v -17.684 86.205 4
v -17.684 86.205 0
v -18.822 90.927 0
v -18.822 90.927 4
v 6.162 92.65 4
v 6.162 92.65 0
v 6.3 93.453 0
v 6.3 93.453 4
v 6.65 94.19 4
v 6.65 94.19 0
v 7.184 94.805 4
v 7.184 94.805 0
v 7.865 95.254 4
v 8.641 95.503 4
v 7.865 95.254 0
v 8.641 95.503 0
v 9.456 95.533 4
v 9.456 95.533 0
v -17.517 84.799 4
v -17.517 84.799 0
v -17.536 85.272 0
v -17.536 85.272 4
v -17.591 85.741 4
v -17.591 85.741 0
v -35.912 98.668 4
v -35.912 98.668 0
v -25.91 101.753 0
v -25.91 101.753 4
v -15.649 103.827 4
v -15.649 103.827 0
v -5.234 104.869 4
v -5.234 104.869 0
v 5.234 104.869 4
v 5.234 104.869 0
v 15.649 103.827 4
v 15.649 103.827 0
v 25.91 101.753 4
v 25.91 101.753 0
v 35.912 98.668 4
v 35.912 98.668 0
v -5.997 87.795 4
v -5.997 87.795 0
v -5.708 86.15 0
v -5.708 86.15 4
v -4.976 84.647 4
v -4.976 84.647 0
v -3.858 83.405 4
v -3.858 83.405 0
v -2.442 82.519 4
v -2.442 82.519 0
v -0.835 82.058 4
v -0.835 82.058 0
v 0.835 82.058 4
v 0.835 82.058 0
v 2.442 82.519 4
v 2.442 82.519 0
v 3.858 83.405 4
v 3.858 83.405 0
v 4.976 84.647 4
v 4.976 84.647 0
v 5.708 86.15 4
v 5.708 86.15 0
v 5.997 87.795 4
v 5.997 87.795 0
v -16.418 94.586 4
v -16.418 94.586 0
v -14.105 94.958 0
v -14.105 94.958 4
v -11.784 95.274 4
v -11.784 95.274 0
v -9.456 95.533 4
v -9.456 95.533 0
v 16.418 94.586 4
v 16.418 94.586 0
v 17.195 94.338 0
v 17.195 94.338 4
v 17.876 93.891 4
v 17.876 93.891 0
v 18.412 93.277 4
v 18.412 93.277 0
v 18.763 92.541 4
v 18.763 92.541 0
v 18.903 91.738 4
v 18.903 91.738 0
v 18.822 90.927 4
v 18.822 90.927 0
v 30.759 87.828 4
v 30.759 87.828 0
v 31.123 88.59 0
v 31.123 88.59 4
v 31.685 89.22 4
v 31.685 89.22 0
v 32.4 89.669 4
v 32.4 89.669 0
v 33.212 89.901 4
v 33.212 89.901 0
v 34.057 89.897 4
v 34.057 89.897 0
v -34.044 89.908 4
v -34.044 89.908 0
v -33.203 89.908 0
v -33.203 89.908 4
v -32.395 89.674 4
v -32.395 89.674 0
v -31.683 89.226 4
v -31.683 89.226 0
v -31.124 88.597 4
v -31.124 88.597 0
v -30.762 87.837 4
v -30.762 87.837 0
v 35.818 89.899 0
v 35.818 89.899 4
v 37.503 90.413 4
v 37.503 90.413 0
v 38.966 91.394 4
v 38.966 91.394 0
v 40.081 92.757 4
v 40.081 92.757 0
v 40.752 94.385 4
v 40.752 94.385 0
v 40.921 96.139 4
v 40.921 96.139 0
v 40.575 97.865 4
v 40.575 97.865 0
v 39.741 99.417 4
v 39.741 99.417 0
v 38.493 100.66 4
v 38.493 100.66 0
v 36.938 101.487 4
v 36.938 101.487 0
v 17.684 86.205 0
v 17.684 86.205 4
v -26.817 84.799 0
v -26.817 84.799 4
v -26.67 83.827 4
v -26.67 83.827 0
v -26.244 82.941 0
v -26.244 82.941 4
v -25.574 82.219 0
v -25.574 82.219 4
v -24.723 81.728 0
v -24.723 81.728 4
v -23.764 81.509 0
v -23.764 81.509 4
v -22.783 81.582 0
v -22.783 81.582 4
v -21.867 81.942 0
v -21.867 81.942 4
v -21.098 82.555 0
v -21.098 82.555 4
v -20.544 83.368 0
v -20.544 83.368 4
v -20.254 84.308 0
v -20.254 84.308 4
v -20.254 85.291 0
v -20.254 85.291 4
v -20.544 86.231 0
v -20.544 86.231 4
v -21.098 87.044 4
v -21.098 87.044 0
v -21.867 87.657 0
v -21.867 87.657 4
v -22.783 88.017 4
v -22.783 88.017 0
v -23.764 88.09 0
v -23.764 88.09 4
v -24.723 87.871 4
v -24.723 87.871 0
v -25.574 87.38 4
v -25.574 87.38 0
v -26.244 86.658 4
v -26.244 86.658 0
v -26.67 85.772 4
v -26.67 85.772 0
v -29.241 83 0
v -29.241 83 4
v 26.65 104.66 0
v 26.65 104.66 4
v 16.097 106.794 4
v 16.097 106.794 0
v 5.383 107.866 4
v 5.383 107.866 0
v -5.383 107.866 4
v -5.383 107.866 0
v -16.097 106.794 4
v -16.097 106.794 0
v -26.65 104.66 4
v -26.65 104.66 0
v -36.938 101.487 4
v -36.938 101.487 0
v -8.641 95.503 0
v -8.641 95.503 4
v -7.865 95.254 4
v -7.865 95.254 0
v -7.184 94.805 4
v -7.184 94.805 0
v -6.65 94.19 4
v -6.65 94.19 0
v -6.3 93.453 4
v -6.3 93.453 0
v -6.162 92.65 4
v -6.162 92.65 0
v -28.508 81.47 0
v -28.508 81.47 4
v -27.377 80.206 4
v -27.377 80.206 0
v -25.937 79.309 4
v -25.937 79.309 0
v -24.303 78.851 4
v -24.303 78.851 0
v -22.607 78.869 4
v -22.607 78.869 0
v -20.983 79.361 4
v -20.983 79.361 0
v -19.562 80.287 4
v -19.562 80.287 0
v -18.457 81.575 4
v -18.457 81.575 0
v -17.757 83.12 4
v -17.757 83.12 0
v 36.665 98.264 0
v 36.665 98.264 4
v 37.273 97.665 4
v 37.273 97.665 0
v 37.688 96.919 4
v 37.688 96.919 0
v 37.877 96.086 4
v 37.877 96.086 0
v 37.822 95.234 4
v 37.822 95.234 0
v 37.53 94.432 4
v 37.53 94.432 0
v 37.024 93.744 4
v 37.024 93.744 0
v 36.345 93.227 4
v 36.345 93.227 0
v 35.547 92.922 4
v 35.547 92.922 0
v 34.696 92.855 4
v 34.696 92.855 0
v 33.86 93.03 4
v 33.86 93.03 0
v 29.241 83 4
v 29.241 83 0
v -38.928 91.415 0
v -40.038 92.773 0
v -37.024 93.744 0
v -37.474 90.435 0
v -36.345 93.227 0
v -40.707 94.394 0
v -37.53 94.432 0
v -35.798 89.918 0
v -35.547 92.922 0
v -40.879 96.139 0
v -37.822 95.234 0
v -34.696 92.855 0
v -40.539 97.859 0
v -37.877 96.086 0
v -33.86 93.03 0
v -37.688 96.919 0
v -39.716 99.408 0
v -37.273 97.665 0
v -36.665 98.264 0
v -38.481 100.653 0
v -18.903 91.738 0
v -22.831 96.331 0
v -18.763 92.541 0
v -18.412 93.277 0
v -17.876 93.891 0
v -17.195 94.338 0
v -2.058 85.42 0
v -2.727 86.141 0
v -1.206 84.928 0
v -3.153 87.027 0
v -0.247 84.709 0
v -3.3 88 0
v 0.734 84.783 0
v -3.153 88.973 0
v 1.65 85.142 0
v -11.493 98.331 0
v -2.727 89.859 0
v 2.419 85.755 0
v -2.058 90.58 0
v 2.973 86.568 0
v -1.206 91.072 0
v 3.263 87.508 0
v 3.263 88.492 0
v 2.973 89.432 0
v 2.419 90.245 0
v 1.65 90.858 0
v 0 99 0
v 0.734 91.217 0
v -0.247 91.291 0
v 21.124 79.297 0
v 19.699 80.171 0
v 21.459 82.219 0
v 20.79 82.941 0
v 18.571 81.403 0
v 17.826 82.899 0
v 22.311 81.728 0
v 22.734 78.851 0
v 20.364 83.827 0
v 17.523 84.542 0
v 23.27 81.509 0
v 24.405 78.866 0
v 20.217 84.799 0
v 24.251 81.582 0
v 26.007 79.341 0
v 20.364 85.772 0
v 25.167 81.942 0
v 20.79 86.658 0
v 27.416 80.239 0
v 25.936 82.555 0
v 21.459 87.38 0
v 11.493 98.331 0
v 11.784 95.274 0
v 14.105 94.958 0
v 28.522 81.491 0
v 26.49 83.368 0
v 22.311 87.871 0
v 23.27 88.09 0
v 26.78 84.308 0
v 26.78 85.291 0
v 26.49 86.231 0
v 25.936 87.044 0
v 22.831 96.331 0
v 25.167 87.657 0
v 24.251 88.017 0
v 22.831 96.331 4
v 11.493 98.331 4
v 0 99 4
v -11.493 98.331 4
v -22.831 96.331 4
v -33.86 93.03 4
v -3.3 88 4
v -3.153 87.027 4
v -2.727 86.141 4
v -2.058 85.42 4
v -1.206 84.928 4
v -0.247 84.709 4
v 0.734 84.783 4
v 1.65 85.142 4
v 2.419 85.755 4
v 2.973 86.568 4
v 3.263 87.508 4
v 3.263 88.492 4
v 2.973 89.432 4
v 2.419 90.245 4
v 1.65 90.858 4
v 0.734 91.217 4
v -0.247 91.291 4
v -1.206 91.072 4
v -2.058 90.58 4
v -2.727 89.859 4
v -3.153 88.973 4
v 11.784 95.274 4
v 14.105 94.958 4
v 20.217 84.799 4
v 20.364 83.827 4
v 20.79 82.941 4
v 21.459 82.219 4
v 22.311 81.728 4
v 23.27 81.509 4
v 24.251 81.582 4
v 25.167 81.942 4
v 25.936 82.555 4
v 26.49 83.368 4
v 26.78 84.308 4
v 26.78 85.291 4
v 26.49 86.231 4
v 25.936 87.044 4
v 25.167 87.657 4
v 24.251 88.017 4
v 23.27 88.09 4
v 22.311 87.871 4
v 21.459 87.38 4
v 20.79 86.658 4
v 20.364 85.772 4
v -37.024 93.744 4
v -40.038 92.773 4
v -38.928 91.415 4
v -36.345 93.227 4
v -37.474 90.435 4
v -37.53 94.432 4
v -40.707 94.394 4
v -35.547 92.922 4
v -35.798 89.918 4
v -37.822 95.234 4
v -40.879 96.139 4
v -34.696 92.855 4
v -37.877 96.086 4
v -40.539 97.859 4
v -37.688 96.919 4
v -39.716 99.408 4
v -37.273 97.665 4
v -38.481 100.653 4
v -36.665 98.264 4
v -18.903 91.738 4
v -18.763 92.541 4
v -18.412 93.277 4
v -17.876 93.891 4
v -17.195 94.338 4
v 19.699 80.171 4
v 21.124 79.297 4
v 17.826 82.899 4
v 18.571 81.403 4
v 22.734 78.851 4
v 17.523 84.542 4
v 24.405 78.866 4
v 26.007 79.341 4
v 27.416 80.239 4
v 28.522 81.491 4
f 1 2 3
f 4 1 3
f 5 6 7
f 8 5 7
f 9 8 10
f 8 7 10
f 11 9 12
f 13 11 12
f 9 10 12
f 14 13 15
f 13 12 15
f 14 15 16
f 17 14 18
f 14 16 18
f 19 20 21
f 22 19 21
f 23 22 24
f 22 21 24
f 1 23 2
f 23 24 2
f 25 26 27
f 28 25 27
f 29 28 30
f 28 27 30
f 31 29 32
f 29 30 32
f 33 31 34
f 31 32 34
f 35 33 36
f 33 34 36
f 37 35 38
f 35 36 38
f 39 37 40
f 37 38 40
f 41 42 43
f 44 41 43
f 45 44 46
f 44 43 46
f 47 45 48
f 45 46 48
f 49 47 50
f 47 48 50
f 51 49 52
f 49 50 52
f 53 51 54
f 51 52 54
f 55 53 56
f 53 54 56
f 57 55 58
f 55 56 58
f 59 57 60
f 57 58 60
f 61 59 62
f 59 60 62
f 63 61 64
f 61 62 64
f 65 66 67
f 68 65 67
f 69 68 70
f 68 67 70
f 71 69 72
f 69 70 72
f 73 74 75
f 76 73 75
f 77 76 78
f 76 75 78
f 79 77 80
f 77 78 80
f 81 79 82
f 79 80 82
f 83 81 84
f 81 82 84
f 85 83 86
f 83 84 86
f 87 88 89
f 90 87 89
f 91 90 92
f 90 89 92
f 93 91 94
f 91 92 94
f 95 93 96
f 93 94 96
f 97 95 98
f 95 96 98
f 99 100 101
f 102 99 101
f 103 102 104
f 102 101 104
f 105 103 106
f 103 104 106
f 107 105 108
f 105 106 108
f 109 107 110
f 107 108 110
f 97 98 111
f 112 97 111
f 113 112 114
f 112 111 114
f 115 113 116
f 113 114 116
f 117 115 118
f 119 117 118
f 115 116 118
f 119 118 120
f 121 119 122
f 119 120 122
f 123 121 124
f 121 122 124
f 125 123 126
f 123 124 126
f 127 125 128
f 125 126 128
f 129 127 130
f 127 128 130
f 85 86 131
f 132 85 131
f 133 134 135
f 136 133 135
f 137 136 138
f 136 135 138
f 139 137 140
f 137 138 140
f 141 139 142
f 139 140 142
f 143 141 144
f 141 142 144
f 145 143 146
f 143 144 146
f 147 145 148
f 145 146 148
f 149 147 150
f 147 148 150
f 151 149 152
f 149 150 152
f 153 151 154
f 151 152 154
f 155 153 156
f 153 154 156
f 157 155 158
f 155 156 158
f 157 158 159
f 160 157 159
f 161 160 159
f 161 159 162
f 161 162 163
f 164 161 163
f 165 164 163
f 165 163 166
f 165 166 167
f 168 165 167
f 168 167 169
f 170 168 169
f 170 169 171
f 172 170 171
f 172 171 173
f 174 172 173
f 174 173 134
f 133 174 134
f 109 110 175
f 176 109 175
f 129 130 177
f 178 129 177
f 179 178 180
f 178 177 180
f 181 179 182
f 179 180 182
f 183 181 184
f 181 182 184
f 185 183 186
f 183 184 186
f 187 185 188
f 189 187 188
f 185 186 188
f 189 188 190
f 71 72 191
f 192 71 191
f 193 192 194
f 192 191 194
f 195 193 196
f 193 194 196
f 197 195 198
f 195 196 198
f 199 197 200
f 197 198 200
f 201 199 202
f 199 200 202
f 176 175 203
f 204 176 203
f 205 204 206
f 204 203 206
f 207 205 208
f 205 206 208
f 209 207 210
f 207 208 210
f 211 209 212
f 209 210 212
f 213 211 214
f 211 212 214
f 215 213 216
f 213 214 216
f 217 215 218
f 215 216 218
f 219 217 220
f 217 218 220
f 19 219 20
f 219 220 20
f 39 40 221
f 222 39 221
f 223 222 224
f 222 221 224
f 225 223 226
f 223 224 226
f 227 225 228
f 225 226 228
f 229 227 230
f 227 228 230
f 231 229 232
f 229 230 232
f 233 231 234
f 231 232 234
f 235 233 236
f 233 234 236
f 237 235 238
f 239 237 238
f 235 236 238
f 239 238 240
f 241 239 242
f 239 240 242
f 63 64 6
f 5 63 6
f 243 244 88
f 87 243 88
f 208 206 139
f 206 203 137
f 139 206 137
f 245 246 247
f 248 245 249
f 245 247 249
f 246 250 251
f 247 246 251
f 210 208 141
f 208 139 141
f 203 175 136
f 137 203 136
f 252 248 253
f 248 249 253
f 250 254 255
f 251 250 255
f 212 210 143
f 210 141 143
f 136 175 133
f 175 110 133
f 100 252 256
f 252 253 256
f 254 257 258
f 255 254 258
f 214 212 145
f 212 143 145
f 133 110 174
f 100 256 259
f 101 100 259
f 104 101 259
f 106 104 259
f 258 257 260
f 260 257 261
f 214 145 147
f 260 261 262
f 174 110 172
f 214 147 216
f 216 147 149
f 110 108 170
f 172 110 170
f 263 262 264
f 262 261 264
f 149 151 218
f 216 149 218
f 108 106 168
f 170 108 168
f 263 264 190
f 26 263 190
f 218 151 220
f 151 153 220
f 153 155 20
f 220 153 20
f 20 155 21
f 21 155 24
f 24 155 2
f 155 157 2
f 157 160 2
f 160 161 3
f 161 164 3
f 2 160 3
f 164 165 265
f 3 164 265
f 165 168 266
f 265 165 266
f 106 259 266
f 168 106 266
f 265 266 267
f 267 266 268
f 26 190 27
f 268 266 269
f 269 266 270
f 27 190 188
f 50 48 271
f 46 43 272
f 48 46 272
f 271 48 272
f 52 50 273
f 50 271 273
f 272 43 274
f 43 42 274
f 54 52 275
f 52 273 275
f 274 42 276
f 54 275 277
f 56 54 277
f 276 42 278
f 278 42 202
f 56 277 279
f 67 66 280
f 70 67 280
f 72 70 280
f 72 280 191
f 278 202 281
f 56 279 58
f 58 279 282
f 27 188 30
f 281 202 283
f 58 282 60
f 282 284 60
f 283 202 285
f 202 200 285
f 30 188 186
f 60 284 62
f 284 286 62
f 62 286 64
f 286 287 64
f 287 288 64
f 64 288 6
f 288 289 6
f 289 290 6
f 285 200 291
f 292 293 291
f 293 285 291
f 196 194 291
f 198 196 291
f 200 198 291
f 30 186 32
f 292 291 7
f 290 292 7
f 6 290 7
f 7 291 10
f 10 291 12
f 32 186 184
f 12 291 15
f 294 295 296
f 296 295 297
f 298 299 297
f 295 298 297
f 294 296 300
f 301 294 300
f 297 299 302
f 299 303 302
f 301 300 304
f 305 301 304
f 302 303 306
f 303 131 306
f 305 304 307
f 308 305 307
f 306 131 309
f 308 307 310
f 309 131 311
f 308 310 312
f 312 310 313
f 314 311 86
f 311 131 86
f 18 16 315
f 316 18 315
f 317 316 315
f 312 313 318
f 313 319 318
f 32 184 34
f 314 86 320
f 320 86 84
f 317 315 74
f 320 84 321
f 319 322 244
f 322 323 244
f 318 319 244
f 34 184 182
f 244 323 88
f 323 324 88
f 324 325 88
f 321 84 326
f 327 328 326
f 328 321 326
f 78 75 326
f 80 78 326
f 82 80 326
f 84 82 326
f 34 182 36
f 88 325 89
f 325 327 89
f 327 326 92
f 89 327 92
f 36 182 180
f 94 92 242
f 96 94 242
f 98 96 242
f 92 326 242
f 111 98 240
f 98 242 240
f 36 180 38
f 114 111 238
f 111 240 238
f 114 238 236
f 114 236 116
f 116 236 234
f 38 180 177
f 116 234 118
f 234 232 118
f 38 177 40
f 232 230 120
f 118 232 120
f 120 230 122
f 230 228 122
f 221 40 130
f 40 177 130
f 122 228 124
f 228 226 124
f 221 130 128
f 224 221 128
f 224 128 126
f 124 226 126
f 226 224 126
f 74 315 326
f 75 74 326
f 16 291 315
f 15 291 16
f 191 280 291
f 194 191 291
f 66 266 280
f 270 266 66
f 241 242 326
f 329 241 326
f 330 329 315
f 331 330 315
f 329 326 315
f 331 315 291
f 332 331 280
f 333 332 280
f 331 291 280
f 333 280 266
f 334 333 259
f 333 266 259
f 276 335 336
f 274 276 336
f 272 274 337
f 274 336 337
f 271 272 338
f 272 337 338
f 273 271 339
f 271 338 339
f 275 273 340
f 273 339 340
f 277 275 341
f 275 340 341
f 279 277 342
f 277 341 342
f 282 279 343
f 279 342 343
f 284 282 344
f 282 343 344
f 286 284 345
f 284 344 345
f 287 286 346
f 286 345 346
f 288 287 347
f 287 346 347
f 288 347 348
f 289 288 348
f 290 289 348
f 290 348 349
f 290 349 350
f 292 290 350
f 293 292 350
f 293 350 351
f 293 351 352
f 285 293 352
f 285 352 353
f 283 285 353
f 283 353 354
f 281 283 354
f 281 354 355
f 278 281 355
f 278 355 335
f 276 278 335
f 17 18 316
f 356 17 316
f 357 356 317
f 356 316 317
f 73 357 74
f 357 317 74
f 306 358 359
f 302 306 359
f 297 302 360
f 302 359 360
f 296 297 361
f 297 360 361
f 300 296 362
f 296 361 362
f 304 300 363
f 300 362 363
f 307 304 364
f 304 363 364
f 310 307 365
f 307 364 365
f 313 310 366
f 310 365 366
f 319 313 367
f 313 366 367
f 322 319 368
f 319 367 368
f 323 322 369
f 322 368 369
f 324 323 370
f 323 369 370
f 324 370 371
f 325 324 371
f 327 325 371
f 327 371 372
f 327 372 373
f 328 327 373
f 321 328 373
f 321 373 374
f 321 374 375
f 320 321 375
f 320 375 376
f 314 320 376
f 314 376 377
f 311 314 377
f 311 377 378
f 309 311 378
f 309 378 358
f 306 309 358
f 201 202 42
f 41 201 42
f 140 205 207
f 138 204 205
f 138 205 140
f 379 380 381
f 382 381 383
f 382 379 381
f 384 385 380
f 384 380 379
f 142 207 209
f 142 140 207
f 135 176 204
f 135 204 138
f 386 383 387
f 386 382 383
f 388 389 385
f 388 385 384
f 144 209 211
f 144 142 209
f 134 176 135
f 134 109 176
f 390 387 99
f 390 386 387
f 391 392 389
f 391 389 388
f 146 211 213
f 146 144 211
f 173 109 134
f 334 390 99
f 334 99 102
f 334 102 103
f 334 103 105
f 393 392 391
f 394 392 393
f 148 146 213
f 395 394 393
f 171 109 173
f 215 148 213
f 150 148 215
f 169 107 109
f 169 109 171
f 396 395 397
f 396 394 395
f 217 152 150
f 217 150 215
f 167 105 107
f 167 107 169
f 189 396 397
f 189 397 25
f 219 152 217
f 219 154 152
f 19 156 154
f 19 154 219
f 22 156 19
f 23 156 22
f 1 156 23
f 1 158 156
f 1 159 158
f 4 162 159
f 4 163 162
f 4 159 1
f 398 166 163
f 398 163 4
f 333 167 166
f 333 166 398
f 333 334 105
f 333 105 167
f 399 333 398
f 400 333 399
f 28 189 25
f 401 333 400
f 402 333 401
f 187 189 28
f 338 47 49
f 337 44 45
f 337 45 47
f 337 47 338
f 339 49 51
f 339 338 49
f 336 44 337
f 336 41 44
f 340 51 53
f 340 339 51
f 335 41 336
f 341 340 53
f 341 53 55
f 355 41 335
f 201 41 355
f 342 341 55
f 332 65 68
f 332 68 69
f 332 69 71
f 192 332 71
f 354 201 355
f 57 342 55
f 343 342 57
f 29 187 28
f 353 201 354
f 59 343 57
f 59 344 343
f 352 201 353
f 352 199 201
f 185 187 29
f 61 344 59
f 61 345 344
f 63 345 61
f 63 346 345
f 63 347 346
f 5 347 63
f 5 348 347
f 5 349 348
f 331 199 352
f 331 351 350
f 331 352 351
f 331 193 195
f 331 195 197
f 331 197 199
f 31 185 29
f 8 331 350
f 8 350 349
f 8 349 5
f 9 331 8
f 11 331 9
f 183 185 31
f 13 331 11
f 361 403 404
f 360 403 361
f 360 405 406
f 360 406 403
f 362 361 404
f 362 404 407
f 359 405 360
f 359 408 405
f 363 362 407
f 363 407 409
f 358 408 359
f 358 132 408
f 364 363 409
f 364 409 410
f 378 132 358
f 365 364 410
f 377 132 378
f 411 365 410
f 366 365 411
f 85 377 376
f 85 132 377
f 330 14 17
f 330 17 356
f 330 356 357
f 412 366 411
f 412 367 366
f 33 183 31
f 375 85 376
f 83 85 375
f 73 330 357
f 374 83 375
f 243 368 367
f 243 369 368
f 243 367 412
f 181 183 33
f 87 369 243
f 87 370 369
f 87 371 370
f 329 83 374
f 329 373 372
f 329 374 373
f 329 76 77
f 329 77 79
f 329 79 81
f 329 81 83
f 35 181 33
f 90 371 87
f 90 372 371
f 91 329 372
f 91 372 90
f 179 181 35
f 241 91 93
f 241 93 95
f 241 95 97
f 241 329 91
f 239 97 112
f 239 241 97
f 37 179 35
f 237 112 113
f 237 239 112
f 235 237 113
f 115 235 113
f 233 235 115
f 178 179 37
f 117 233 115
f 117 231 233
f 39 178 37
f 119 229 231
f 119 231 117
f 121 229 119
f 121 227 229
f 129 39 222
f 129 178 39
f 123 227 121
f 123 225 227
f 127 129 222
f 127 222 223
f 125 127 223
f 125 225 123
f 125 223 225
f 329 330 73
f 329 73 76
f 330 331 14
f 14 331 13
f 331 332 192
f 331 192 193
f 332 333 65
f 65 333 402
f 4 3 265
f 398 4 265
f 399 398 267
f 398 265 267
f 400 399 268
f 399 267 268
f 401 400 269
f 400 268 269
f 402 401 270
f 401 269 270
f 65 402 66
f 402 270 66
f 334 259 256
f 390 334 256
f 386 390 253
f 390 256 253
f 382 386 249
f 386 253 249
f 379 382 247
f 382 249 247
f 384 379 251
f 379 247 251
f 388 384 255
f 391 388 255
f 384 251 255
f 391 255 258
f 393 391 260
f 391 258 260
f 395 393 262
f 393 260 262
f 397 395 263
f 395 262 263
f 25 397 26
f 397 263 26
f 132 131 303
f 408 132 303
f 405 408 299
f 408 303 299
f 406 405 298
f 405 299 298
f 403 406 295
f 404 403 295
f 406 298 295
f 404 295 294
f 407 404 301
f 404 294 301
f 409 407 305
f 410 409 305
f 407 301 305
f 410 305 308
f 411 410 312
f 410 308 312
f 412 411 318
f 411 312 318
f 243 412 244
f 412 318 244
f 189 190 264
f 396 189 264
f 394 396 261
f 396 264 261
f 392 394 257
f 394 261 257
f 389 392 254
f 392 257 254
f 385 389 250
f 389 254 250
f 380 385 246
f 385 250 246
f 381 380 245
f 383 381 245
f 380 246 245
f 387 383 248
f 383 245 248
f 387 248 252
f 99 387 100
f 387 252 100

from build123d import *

# Parameters (mm, degrees)
F0_R     = 3.3
F1_DEPTH = 4
F2_D     = 6.6


with BuildPart() as f1:
    # F0 (on Top) → F1 (new body)
    with BuildSketch(Plane.XY):
        with BuildLine():
            ThreePointArc((34.0567992704, 89.8965680339), (40.7519566994, 94.3854046152), (36.9381754792, 101.4868030449))
            ThreePointArc((36.9381754792, 101.4868030449), (0, 108), (-36.9381754792, 101.4868030449))
            ThreePointArc((-36.9381754792, 101.4868030449), (-40.7070213733, 94.393880651), (-34.0444122932, 89.9079707427))
            ThreePointArc((-34.0444122932, 89.9079707427), (-32.0231312915, 89.4750579815), (-30.7617113386, 87.8374346888))
            Line((-30.7617113386, 87.8374346888), (-29.240736677, 82.9998754131))
            ThreePointArc((-29.240736677, 82.9998754131), (-25.1204073514, 90.5812626016), (-17.6838927225, 86.2048718935))
            Line((-17.6838927225, 86.2048718935), (-18.8216514871, 90.9271435562))
            ThreePointArc((-18.8216514871, 90.9271435562), (-18.4124399871, 93.2770471476), (-16.4181773429, 94.585640838))
            ThreePointArc((-16.4181773429, 94.585640838), (-12.9456893063, 95.1231261491), (-9.455857384, 95.533170999))
            ThreePointArc((-9.455857384, 95.533170999), (-7.1844187157, 94.8051137786), (-6.1621056327, 92.6500321326))
            Line((-6.1621056327, 92.6500321326), (-5.9965124161, 87.7954545455))
            ThreePointArc((-5.9965124161, 87.7954545455), (-0.1022875924, 93.9991280407), (6, 88))
            ThreePointArc((6, 88), (5.9991280407, 87.8977124076), (5.9965124161, 87.7954545455))
            Line((5.9965124161, 87.7954545455), (6.1621056327, 92.6500321326))
            ThreePointArc((6.1621056327, 92.6500321326), (7.1844187157, 94.8051137786), (9.455857384, 95.533170999))
            ThreePointArc((9.455857384, 95.533170999), (12.9456893063, 95.1231261491), (16.4181773429, 94.585640838))
            ThreePointArc((16.4181773429, 94.585640838), (18.4124399871, 93.2770471476), (18.8216514871, 90.9271435562))
            Line((18.8216514871, 90.9271435562), (17.6838927225, 86.2048718935))
            ThreePointArc((17.6838927225, 86.2048718935), (24.224611805, 90.7576048489), (29.5169770949, 84.7994798824))
            ThreePointArc((29.5169770949, 84.7994798824), (29.4475149075, 83.8891385982), (29.240736677, 82.9998754131))
            Line((29.240736677, 82.9998754131), (30.7588194113, 87.8282367253))
            ThreePointArc((30.7588194113, 87.8282367253), (32.026773101, 89.4699693779), (34.0567992704, 89.8965680339))
        make_face()
        with BuildLine():
            ThreePointArc((-35.9121150493, 98.6677251825), (-1e-10, 105), (35.9121150492, 98.6677251825))
            ThreePointArc((35.9121150492, 98.6677251825), (37.7051324816, 94.8225868902), (33.8599941892, 93.0295694578))
            ThreePointArc((33.8599941892, 93.0295694578), (-1e-10, 99), (-33.8599941894, 93.0295694578))
            ThreePointArc((-33.8599941892, 93.0295694574), (-37.7051324816, 94.8225868898), (-35.9121150492, 98.6677251821))
        make_face(mode=Mode.SUBTRACT)
        with BuildLine():
            ThreePointArc((-5.9965124161, 87.7954545455), (0, 82), (5.9965124161, 87.7954545455))
            ThreePointArc((5.9965124161, 87.7954545455), (5.9991280407, 87.8977124076), (6, 88))
            ThreePointArc((6, 88), (-0.1022875924, 93.9991280407), (-5.9965124161, 87.7954545455))
        make_face()
        with Locations((0, 88)):
            Circle(F0_R, mode=Mode.SUBTRACT)
        with BuildLine():
            ThreePointArc((17.6838927225, 86.2048718935), (21.9135468384, 79.0176971631), (29.240736677, 82.9998754131))
            ThreePointArc((29.240736677, 82.9998754131), (29.4475149075, 83.8891385982), (29.5169770949, 84.7994798824))
            ThreePointArc((29.5169770949, 84.7994798824), (24.224611805, 90.7576048489), (17.6838927225, 86.2048718935))
        make_face()
        with Locations((23.5169770949, 84.7994798824)):
            Circle(F0_R, mode=Mode.SUBTRACT)
        with BuildLine():
            ThreePointArc((-17.6838927225, 86.2048718935), (-25.1204073514, 90.5812626016), (-29.240736677, 82.9998754131))
            ThreePointArc((-29.240736677, 82.9998754131), (-22.6066358108, 78.8689420698), (-17.5169770949, 84.7994798824))
            ThreePointArc((-17.5169770949, 84.7994798824), (-17.5588521283, 85.5071145925), (-17.6838927225, 86.2048718935))
        make_face()
        with Locations((-23.5169770949, 84.7994798824)):
            Circle(F0_R, mode=Mode.SUBTRACT)
        with Locations((0, 88)):
            Circle(F0_R)
        with Locations((23.5169770949, 84.7994798824)):
            Circle(F0_R)
        with Locations((-23.5169770949, 84.7994798824)):
            Circle(F0_R)
    extrude(amount=F1_DEPTH)

    # F2 (through all)
    with Locations(Plane(origin=(0, 0, 0), x_dir=(1, 0, 0), z_dir=(0, 0, -1))):
        with Locations((-23.5169770949, -84.7994798824), (0, -88), (23.5169770949, -84.7994798824)):
            Hole(F2_D / 2)


solid = f1.part
